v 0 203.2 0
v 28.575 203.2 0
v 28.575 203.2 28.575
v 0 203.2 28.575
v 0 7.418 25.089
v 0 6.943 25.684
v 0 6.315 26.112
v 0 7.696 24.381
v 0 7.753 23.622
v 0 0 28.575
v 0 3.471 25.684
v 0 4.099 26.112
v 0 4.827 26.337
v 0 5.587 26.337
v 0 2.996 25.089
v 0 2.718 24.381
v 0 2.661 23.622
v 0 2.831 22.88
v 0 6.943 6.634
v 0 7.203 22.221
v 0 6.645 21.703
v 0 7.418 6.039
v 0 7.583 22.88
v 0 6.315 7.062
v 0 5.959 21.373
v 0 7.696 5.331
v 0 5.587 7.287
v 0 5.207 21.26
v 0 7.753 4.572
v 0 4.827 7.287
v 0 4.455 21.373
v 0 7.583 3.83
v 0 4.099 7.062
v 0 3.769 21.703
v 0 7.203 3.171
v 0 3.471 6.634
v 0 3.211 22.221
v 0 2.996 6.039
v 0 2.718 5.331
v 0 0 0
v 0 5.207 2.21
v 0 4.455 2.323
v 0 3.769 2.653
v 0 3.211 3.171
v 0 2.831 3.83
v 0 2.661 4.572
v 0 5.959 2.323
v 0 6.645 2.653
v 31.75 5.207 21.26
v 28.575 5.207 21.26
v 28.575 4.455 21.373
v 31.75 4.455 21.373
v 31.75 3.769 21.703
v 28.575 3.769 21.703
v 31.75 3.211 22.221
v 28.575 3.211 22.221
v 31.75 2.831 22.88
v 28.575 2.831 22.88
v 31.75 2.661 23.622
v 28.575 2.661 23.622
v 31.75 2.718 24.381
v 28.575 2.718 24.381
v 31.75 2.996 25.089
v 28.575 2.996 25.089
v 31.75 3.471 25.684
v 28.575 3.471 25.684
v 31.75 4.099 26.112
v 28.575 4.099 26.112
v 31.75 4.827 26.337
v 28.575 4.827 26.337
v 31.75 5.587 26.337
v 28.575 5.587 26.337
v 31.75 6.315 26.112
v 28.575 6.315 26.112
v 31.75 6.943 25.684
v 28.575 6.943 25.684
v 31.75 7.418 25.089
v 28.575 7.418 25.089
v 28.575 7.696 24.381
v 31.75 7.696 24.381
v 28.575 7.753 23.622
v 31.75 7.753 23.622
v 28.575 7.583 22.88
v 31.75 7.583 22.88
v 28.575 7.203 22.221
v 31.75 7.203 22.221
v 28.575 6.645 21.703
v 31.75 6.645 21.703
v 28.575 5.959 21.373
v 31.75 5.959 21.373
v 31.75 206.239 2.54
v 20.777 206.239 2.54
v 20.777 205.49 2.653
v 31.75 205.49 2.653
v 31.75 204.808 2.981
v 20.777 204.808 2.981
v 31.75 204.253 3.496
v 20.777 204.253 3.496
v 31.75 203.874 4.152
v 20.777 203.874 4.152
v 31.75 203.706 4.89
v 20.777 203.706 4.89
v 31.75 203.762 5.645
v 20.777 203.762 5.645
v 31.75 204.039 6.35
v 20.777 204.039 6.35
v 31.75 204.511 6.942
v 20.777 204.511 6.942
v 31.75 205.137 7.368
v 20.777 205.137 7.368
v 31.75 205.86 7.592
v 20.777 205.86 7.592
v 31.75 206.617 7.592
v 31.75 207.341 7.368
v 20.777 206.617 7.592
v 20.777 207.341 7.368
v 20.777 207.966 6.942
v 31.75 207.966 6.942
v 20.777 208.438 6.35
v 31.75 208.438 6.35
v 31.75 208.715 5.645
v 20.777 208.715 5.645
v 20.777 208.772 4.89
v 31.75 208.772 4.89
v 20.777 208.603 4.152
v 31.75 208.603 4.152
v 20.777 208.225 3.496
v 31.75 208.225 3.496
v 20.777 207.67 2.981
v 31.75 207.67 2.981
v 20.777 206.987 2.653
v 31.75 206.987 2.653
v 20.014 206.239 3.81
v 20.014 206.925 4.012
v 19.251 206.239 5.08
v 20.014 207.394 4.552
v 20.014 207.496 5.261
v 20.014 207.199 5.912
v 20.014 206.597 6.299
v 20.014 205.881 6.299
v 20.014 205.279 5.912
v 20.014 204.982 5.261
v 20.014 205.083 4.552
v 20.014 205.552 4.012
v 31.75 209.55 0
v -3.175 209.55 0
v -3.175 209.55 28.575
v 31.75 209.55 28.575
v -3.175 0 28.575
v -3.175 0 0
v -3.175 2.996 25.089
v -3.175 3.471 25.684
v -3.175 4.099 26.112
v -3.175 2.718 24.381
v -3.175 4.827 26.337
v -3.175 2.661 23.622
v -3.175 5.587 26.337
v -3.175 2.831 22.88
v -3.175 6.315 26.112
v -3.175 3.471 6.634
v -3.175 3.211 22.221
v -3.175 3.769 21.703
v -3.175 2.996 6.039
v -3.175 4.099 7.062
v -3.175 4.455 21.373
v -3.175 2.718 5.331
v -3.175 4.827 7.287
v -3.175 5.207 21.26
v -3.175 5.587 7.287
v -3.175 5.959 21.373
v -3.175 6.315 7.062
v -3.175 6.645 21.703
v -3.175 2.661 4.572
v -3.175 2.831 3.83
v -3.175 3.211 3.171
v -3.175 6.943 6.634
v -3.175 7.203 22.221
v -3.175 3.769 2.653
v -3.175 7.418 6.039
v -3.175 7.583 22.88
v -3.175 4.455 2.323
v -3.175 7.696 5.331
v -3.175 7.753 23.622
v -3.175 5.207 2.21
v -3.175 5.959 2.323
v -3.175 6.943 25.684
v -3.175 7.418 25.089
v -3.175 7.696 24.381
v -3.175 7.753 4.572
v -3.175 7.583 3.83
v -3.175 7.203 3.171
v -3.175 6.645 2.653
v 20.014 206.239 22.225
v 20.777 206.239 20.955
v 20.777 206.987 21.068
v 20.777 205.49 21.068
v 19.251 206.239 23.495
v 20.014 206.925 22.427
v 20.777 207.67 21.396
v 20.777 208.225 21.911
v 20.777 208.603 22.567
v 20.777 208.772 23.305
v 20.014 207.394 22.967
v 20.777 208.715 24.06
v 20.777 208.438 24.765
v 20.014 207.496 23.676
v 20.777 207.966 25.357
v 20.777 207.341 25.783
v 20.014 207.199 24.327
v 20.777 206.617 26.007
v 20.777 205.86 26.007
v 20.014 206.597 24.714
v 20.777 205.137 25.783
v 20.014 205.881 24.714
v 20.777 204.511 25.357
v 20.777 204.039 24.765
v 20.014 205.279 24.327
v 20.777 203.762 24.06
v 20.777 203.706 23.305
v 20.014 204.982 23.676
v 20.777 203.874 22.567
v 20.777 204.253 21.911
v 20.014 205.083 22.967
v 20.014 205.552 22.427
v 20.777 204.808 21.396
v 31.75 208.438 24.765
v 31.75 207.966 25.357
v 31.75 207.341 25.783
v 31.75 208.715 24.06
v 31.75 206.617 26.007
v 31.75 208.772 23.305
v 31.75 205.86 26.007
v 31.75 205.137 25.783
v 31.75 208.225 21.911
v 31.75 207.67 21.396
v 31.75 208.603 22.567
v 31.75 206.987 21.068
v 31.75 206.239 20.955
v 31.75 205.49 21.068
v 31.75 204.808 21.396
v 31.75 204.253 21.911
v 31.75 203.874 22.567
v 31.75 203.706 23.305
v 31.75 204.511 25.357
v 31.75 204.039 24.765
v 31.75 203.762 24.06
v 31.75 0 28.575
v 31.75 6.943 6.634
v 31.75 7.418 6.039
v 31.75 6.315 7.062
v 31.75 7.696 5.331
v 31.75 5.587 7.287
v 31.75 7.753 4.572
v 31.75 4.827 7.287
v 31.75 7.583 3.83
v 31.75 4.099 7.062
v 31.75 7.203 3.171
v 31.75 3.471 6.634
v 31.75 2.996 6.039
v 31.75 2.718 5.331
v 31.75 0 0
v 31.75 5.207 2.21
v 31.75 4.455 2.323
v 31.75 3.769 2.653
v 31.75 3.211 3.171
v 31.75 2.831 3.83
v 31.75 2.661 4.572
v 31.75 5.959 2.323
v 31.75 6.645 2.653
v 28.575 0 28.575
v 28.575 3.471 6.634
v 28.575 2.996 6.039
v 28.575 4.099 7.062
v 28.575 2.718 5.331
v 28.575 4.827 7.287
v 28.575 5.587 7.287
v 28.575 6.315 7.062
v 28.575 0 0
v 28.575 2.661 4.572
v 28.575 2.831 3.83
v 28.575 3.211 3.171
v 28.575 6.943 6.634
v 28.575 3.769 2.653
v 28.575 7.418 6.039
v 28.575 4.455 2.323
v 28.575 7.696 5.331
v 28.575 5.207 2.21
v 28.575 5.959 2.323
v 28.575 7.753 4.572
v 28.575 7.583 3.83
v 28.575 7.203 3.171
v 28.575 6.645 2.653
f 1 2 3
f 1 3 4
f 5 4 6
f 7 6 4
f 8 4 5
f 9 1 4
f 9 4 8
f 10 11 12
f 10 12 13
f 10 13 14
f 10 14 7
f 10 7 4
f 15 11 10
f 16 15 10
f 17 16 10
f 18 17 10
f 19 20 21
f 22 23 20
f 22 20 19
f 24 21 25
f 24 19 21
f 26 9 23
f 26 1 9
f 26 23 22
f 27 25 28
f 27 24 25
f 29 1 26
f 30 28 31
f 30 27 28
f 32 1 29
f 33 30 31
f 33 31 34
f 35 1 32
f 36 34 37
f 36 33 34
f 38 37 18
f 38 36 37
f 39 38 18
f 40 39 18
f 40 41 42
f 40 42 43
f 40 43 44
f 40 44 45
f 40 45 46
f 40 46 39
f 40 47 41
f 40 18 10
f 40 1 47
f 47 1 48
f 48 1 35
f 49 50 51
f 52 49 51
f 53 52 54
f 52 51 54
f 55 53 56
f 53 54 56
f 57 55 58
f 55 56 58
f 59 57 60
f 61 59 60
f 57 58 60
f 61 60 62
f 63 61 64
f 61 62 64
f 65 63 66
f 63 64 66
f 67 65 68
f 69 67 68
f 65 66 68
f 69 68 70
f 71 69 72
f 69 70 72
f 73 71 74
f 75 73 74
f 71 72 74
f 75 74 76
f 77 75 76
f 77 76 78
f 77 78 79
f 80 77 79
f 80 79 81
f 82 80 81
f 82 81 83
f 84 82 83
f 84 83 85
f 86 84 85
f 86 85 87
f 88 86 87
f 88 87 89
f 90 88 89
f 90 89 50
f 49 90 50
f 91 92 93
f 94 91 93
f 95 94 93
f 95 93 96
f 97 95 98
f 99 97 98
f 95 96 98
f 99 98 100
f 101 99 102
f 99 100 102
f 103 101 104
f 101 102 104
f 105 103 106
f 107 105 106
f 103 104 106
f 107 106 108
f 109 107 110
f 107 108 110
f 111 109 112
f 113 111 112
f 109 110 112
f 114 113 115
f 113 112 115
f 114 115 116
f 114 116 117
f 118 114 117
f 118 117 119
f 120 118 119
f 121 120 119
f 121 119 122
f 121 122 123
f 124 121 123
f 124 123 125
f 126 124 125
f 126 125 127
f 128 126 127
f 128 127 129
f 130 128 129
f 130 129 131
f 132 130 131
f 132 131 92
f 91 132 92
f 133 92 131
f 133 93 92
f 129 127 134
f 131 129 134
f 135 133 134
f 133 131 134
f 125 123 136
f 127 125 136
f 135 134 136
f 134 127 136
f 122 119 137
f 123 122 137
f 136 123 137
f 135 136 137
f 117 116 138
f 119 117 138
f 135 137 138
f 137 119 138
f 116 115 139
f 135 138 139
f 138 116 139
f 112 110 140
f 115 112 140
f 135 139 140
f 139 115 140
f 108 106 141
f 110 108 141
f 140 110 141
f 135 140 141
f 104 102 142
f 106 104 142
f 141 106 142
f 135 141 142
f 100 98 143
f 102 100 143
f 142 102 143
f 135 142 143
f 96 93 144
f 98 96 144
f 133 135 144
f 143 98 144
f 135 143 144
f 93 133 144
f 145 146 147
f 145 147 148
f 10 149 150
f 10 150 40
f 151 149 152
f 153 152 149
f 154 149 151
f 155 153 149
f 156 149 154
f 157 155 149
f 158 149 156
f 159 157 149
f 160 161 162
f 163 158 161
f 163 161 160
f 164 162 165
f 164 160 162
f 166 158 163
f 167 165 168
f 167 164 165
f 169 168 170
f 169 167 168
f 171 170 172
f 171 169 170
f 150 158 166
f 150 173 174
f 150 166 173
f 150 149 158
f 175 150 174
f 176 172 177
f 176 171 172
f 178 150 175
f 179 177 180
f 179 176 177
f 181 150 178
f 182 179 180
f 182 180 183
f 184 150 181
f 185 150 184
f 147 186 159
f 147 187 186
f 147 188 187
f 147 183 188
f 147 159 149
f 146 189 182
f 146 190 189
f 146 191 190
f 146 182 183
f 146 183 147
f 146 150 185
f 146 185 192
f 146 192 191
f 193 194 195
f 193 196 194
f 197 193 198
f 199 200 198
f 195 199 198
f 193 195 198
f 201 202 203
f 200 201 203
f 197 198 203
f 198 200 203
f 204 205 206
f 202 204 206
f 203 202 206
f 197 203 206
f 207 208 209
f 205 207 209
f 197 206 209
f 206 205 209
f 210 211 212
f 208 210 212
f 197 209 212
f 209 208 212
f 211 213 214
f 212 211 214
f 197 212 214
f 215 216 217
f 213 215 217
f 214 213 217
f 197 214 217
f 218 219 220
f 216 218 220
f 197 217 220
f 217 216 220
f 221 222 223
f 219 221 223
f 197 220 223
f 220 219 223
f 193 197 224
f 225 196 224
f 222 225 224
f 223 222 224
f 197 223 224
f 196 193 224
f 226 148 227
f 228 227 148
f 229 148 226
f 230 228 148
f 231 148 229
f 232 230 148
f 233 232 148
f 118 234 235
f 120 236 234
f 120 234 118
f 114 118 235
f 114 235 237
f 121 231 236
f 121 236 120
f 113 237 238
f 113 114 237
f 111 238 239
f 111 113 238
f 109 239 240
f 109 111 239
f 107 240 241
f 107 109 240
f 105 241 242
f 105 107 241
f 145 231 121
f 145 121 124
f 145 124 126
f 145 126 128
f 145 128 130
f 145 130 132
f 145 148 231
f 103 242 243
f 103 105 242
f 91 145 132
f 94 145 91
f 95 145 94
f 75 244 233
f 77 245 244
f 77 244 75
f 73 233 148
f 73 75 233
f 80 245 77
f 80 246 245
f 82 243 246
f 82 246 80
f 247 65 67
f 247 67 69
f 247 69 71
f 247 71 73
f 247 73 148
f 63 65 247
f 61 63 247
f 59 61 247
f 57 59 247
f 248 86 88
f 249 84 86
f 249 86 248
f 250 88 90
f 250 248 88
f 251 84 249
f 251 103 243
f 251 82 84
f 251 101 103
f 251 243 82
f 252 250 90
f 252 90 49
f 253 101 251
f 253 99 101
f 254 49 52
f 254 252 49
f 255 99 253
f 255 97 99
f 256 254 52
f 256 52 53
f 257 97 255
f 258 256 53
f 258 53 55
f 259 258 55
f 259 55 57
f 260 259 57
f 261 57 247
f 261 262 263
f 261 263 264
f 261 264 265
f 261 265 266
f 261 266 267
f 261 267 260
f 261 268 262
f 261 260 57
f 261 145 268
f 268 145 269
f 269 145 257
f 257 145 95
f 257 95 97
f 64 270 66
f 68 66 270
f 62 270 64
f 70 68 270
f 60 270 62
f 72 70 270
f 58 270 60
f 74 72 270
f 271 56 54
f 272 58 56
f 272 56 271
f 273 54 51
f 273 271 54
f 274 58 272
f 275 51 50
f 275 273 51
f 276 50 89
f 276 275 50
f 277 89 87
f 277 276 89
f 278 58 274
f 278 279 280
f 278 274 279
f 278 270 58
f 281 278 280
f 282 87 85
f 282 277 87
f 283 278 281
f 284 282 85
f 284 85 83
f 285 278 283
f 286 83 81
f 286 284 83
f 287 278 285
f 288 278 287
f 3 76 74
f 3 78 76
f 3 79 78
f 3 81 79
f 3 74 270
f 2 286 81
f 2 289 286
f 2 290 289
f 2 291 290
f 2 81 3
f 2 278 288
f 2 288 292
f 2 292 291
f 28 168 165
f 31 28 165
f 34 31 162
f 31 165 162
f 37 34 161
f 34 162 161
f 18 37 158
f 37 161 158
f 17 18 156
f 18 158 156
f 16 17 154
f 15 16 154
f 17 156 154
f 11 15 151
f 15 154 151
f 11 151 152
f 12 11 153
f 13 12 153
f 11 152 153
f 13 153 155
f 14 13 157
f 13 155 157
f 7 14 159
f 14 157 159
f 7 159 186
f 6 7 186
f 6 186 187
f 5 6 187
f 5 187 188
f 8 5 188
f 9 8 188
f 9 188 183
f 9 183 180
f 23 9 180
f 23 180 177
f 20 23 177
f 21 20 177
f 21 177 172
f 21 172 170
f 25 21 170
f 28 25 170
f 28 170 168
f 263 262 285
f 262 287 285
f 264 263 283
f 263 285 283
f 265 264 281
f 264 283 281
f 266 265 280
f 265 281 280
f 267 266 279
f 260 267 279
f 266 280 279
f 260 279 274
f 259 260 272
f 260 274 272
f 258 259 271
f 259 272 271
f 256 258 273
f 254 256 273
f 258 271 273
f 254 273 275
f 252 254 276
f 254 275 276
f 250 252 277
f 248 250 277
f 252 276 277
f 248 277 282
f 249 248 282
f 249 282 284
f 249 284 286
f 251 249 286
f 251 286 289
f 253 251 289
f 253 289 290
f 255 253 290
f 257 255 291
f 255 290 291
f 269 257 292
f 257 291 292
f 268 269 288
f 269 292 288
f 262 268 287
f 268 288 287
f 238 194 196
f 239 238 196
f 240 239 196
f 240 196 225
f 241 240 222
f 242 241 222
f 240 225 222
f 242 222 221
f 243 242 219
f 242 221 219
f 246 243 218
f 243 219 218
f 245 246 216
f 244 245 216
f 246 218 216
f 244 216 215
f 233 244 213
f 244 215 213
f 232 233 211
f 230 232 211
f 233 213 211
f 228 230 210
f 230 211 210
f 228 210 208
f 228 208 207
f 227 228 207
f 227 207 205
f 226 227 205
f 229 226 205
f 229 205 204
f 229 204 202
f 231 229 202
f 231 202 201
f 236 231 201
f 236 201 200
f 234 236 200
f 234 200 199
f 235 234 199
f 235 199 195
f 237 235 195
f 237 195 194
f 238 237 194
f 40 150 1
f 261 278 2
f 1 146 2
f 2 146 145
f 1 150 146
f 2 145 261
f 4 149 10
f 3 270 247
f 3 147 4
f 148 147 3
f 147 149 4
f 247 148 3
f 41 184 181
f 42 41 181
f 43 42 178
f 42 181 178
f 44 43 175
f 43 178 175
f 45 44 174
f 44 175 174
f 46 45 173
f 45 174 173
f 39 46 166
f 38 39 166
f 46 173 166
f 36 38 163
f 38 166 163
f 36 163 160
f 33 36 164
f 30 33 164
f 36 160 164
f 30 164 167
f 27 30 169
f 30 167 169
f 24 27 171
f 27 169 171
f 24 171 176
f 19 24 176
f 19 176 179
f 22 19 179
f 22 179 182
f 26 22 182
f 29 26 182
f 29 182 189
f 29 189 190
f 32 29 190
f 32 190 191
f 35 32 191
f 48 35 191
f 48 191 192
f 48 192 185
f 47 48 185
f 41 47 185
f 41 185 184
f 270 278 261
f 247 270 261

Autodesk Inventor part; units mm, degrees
ref_plane "YZ Plane" through (0, 0, 0) normal (1, 0, 0) x (0, 1, 0)
ref_plane "XZ Plane" through (0, 0, 0) normal (0, 1, 0) x (-1, 0, 0)
ref_plane "XY Plane" through (0, 0, 0) normal (0, 0, 1) x (1, 0, 0)
sketch "Sketch1" plane through (0, 0, 0) normal (0, 0, 1) x (1, 0, 0)
  line L0 (0, 0) -> (28.575, 0)
  line L1 (28.575, 0) -> (28.575, 203.2)
  line L2 (28.575, 203.2) -> (0, 203.2)
  line L3 (0, 203.2) -> (0, 0)
  line L4 (31.75, 209.55) -> (31.75, 0)
  line L5 (-3.175, 0) -> (-3.175, 209.55)
  line L6 (-3.175, 209.55) -> (31.75, 209.55)
  line L7 (-3.175, 0) -> (31.75, 0)
  dimension "d0" = 28.575
  dimension "d1" = 203.2
  dimension "d2" = 3.175
  dimension "d24" = 6.35
  dimension "d25" = 3.175
extrude "Extrusion1" add sketch "Sketch1" along normal blind 28.575 contours L7 L5 L6 L4 L1 L2 L3
sketch "Sketch2" plane through (31.75, 0, 0) normal (1, 0, 0) x (0, 0, -1)
  line L0 (0, 0) -> (-28.575, 0) projected
  line L1 (0, 209.55) -> (0, 0) projected
  point P0 (-23.8125, 5.207)
  point P1 (-4.7625, 5.207)
  dimension "d5" = 5.207
  dimension "d6" = 19.05
  dimension "d7" = 28.575
  dimension "d8" = 4.7625
hole "Hole1" at (31.75, 5.207, 23.8125) at (31.75, 5.207, 4.7625) direction (-1, 0, 0) diameter 5.1054 end through all clearance for "Flat Head Machine Screw (82)" size "#10" standard "Ansi Unified Screw Threads"
sketch "Sketch4" plane through (31.75, 0, 0) normal (1, 0, 0) x (0, 0, -1)
  line L0 (-28.575, 0) -> (-28.575, 209.55) projected
  line L1 (0, 209.55) -> (0, 0) projected
  point P0 (-23.495, 206.2387)
  point P1 (-5.08, 206.2387)
  dimension "d26" = 5.08
  dimension "d27" = 5.08
  dimension "d28" = 18.415
hole "Hole3" at (31.75, 206.2387, 23.495) at (31.75, 206.2387, 5.08) direction (-1, 0, 0) diameter 5.08 depth 10.9728 tip angle 118
equation "\"d8\" = -0.5 * d6 + 0.5 * d7"
equation "\"d27\" = d26"
properties material "Aluminum 6061"
